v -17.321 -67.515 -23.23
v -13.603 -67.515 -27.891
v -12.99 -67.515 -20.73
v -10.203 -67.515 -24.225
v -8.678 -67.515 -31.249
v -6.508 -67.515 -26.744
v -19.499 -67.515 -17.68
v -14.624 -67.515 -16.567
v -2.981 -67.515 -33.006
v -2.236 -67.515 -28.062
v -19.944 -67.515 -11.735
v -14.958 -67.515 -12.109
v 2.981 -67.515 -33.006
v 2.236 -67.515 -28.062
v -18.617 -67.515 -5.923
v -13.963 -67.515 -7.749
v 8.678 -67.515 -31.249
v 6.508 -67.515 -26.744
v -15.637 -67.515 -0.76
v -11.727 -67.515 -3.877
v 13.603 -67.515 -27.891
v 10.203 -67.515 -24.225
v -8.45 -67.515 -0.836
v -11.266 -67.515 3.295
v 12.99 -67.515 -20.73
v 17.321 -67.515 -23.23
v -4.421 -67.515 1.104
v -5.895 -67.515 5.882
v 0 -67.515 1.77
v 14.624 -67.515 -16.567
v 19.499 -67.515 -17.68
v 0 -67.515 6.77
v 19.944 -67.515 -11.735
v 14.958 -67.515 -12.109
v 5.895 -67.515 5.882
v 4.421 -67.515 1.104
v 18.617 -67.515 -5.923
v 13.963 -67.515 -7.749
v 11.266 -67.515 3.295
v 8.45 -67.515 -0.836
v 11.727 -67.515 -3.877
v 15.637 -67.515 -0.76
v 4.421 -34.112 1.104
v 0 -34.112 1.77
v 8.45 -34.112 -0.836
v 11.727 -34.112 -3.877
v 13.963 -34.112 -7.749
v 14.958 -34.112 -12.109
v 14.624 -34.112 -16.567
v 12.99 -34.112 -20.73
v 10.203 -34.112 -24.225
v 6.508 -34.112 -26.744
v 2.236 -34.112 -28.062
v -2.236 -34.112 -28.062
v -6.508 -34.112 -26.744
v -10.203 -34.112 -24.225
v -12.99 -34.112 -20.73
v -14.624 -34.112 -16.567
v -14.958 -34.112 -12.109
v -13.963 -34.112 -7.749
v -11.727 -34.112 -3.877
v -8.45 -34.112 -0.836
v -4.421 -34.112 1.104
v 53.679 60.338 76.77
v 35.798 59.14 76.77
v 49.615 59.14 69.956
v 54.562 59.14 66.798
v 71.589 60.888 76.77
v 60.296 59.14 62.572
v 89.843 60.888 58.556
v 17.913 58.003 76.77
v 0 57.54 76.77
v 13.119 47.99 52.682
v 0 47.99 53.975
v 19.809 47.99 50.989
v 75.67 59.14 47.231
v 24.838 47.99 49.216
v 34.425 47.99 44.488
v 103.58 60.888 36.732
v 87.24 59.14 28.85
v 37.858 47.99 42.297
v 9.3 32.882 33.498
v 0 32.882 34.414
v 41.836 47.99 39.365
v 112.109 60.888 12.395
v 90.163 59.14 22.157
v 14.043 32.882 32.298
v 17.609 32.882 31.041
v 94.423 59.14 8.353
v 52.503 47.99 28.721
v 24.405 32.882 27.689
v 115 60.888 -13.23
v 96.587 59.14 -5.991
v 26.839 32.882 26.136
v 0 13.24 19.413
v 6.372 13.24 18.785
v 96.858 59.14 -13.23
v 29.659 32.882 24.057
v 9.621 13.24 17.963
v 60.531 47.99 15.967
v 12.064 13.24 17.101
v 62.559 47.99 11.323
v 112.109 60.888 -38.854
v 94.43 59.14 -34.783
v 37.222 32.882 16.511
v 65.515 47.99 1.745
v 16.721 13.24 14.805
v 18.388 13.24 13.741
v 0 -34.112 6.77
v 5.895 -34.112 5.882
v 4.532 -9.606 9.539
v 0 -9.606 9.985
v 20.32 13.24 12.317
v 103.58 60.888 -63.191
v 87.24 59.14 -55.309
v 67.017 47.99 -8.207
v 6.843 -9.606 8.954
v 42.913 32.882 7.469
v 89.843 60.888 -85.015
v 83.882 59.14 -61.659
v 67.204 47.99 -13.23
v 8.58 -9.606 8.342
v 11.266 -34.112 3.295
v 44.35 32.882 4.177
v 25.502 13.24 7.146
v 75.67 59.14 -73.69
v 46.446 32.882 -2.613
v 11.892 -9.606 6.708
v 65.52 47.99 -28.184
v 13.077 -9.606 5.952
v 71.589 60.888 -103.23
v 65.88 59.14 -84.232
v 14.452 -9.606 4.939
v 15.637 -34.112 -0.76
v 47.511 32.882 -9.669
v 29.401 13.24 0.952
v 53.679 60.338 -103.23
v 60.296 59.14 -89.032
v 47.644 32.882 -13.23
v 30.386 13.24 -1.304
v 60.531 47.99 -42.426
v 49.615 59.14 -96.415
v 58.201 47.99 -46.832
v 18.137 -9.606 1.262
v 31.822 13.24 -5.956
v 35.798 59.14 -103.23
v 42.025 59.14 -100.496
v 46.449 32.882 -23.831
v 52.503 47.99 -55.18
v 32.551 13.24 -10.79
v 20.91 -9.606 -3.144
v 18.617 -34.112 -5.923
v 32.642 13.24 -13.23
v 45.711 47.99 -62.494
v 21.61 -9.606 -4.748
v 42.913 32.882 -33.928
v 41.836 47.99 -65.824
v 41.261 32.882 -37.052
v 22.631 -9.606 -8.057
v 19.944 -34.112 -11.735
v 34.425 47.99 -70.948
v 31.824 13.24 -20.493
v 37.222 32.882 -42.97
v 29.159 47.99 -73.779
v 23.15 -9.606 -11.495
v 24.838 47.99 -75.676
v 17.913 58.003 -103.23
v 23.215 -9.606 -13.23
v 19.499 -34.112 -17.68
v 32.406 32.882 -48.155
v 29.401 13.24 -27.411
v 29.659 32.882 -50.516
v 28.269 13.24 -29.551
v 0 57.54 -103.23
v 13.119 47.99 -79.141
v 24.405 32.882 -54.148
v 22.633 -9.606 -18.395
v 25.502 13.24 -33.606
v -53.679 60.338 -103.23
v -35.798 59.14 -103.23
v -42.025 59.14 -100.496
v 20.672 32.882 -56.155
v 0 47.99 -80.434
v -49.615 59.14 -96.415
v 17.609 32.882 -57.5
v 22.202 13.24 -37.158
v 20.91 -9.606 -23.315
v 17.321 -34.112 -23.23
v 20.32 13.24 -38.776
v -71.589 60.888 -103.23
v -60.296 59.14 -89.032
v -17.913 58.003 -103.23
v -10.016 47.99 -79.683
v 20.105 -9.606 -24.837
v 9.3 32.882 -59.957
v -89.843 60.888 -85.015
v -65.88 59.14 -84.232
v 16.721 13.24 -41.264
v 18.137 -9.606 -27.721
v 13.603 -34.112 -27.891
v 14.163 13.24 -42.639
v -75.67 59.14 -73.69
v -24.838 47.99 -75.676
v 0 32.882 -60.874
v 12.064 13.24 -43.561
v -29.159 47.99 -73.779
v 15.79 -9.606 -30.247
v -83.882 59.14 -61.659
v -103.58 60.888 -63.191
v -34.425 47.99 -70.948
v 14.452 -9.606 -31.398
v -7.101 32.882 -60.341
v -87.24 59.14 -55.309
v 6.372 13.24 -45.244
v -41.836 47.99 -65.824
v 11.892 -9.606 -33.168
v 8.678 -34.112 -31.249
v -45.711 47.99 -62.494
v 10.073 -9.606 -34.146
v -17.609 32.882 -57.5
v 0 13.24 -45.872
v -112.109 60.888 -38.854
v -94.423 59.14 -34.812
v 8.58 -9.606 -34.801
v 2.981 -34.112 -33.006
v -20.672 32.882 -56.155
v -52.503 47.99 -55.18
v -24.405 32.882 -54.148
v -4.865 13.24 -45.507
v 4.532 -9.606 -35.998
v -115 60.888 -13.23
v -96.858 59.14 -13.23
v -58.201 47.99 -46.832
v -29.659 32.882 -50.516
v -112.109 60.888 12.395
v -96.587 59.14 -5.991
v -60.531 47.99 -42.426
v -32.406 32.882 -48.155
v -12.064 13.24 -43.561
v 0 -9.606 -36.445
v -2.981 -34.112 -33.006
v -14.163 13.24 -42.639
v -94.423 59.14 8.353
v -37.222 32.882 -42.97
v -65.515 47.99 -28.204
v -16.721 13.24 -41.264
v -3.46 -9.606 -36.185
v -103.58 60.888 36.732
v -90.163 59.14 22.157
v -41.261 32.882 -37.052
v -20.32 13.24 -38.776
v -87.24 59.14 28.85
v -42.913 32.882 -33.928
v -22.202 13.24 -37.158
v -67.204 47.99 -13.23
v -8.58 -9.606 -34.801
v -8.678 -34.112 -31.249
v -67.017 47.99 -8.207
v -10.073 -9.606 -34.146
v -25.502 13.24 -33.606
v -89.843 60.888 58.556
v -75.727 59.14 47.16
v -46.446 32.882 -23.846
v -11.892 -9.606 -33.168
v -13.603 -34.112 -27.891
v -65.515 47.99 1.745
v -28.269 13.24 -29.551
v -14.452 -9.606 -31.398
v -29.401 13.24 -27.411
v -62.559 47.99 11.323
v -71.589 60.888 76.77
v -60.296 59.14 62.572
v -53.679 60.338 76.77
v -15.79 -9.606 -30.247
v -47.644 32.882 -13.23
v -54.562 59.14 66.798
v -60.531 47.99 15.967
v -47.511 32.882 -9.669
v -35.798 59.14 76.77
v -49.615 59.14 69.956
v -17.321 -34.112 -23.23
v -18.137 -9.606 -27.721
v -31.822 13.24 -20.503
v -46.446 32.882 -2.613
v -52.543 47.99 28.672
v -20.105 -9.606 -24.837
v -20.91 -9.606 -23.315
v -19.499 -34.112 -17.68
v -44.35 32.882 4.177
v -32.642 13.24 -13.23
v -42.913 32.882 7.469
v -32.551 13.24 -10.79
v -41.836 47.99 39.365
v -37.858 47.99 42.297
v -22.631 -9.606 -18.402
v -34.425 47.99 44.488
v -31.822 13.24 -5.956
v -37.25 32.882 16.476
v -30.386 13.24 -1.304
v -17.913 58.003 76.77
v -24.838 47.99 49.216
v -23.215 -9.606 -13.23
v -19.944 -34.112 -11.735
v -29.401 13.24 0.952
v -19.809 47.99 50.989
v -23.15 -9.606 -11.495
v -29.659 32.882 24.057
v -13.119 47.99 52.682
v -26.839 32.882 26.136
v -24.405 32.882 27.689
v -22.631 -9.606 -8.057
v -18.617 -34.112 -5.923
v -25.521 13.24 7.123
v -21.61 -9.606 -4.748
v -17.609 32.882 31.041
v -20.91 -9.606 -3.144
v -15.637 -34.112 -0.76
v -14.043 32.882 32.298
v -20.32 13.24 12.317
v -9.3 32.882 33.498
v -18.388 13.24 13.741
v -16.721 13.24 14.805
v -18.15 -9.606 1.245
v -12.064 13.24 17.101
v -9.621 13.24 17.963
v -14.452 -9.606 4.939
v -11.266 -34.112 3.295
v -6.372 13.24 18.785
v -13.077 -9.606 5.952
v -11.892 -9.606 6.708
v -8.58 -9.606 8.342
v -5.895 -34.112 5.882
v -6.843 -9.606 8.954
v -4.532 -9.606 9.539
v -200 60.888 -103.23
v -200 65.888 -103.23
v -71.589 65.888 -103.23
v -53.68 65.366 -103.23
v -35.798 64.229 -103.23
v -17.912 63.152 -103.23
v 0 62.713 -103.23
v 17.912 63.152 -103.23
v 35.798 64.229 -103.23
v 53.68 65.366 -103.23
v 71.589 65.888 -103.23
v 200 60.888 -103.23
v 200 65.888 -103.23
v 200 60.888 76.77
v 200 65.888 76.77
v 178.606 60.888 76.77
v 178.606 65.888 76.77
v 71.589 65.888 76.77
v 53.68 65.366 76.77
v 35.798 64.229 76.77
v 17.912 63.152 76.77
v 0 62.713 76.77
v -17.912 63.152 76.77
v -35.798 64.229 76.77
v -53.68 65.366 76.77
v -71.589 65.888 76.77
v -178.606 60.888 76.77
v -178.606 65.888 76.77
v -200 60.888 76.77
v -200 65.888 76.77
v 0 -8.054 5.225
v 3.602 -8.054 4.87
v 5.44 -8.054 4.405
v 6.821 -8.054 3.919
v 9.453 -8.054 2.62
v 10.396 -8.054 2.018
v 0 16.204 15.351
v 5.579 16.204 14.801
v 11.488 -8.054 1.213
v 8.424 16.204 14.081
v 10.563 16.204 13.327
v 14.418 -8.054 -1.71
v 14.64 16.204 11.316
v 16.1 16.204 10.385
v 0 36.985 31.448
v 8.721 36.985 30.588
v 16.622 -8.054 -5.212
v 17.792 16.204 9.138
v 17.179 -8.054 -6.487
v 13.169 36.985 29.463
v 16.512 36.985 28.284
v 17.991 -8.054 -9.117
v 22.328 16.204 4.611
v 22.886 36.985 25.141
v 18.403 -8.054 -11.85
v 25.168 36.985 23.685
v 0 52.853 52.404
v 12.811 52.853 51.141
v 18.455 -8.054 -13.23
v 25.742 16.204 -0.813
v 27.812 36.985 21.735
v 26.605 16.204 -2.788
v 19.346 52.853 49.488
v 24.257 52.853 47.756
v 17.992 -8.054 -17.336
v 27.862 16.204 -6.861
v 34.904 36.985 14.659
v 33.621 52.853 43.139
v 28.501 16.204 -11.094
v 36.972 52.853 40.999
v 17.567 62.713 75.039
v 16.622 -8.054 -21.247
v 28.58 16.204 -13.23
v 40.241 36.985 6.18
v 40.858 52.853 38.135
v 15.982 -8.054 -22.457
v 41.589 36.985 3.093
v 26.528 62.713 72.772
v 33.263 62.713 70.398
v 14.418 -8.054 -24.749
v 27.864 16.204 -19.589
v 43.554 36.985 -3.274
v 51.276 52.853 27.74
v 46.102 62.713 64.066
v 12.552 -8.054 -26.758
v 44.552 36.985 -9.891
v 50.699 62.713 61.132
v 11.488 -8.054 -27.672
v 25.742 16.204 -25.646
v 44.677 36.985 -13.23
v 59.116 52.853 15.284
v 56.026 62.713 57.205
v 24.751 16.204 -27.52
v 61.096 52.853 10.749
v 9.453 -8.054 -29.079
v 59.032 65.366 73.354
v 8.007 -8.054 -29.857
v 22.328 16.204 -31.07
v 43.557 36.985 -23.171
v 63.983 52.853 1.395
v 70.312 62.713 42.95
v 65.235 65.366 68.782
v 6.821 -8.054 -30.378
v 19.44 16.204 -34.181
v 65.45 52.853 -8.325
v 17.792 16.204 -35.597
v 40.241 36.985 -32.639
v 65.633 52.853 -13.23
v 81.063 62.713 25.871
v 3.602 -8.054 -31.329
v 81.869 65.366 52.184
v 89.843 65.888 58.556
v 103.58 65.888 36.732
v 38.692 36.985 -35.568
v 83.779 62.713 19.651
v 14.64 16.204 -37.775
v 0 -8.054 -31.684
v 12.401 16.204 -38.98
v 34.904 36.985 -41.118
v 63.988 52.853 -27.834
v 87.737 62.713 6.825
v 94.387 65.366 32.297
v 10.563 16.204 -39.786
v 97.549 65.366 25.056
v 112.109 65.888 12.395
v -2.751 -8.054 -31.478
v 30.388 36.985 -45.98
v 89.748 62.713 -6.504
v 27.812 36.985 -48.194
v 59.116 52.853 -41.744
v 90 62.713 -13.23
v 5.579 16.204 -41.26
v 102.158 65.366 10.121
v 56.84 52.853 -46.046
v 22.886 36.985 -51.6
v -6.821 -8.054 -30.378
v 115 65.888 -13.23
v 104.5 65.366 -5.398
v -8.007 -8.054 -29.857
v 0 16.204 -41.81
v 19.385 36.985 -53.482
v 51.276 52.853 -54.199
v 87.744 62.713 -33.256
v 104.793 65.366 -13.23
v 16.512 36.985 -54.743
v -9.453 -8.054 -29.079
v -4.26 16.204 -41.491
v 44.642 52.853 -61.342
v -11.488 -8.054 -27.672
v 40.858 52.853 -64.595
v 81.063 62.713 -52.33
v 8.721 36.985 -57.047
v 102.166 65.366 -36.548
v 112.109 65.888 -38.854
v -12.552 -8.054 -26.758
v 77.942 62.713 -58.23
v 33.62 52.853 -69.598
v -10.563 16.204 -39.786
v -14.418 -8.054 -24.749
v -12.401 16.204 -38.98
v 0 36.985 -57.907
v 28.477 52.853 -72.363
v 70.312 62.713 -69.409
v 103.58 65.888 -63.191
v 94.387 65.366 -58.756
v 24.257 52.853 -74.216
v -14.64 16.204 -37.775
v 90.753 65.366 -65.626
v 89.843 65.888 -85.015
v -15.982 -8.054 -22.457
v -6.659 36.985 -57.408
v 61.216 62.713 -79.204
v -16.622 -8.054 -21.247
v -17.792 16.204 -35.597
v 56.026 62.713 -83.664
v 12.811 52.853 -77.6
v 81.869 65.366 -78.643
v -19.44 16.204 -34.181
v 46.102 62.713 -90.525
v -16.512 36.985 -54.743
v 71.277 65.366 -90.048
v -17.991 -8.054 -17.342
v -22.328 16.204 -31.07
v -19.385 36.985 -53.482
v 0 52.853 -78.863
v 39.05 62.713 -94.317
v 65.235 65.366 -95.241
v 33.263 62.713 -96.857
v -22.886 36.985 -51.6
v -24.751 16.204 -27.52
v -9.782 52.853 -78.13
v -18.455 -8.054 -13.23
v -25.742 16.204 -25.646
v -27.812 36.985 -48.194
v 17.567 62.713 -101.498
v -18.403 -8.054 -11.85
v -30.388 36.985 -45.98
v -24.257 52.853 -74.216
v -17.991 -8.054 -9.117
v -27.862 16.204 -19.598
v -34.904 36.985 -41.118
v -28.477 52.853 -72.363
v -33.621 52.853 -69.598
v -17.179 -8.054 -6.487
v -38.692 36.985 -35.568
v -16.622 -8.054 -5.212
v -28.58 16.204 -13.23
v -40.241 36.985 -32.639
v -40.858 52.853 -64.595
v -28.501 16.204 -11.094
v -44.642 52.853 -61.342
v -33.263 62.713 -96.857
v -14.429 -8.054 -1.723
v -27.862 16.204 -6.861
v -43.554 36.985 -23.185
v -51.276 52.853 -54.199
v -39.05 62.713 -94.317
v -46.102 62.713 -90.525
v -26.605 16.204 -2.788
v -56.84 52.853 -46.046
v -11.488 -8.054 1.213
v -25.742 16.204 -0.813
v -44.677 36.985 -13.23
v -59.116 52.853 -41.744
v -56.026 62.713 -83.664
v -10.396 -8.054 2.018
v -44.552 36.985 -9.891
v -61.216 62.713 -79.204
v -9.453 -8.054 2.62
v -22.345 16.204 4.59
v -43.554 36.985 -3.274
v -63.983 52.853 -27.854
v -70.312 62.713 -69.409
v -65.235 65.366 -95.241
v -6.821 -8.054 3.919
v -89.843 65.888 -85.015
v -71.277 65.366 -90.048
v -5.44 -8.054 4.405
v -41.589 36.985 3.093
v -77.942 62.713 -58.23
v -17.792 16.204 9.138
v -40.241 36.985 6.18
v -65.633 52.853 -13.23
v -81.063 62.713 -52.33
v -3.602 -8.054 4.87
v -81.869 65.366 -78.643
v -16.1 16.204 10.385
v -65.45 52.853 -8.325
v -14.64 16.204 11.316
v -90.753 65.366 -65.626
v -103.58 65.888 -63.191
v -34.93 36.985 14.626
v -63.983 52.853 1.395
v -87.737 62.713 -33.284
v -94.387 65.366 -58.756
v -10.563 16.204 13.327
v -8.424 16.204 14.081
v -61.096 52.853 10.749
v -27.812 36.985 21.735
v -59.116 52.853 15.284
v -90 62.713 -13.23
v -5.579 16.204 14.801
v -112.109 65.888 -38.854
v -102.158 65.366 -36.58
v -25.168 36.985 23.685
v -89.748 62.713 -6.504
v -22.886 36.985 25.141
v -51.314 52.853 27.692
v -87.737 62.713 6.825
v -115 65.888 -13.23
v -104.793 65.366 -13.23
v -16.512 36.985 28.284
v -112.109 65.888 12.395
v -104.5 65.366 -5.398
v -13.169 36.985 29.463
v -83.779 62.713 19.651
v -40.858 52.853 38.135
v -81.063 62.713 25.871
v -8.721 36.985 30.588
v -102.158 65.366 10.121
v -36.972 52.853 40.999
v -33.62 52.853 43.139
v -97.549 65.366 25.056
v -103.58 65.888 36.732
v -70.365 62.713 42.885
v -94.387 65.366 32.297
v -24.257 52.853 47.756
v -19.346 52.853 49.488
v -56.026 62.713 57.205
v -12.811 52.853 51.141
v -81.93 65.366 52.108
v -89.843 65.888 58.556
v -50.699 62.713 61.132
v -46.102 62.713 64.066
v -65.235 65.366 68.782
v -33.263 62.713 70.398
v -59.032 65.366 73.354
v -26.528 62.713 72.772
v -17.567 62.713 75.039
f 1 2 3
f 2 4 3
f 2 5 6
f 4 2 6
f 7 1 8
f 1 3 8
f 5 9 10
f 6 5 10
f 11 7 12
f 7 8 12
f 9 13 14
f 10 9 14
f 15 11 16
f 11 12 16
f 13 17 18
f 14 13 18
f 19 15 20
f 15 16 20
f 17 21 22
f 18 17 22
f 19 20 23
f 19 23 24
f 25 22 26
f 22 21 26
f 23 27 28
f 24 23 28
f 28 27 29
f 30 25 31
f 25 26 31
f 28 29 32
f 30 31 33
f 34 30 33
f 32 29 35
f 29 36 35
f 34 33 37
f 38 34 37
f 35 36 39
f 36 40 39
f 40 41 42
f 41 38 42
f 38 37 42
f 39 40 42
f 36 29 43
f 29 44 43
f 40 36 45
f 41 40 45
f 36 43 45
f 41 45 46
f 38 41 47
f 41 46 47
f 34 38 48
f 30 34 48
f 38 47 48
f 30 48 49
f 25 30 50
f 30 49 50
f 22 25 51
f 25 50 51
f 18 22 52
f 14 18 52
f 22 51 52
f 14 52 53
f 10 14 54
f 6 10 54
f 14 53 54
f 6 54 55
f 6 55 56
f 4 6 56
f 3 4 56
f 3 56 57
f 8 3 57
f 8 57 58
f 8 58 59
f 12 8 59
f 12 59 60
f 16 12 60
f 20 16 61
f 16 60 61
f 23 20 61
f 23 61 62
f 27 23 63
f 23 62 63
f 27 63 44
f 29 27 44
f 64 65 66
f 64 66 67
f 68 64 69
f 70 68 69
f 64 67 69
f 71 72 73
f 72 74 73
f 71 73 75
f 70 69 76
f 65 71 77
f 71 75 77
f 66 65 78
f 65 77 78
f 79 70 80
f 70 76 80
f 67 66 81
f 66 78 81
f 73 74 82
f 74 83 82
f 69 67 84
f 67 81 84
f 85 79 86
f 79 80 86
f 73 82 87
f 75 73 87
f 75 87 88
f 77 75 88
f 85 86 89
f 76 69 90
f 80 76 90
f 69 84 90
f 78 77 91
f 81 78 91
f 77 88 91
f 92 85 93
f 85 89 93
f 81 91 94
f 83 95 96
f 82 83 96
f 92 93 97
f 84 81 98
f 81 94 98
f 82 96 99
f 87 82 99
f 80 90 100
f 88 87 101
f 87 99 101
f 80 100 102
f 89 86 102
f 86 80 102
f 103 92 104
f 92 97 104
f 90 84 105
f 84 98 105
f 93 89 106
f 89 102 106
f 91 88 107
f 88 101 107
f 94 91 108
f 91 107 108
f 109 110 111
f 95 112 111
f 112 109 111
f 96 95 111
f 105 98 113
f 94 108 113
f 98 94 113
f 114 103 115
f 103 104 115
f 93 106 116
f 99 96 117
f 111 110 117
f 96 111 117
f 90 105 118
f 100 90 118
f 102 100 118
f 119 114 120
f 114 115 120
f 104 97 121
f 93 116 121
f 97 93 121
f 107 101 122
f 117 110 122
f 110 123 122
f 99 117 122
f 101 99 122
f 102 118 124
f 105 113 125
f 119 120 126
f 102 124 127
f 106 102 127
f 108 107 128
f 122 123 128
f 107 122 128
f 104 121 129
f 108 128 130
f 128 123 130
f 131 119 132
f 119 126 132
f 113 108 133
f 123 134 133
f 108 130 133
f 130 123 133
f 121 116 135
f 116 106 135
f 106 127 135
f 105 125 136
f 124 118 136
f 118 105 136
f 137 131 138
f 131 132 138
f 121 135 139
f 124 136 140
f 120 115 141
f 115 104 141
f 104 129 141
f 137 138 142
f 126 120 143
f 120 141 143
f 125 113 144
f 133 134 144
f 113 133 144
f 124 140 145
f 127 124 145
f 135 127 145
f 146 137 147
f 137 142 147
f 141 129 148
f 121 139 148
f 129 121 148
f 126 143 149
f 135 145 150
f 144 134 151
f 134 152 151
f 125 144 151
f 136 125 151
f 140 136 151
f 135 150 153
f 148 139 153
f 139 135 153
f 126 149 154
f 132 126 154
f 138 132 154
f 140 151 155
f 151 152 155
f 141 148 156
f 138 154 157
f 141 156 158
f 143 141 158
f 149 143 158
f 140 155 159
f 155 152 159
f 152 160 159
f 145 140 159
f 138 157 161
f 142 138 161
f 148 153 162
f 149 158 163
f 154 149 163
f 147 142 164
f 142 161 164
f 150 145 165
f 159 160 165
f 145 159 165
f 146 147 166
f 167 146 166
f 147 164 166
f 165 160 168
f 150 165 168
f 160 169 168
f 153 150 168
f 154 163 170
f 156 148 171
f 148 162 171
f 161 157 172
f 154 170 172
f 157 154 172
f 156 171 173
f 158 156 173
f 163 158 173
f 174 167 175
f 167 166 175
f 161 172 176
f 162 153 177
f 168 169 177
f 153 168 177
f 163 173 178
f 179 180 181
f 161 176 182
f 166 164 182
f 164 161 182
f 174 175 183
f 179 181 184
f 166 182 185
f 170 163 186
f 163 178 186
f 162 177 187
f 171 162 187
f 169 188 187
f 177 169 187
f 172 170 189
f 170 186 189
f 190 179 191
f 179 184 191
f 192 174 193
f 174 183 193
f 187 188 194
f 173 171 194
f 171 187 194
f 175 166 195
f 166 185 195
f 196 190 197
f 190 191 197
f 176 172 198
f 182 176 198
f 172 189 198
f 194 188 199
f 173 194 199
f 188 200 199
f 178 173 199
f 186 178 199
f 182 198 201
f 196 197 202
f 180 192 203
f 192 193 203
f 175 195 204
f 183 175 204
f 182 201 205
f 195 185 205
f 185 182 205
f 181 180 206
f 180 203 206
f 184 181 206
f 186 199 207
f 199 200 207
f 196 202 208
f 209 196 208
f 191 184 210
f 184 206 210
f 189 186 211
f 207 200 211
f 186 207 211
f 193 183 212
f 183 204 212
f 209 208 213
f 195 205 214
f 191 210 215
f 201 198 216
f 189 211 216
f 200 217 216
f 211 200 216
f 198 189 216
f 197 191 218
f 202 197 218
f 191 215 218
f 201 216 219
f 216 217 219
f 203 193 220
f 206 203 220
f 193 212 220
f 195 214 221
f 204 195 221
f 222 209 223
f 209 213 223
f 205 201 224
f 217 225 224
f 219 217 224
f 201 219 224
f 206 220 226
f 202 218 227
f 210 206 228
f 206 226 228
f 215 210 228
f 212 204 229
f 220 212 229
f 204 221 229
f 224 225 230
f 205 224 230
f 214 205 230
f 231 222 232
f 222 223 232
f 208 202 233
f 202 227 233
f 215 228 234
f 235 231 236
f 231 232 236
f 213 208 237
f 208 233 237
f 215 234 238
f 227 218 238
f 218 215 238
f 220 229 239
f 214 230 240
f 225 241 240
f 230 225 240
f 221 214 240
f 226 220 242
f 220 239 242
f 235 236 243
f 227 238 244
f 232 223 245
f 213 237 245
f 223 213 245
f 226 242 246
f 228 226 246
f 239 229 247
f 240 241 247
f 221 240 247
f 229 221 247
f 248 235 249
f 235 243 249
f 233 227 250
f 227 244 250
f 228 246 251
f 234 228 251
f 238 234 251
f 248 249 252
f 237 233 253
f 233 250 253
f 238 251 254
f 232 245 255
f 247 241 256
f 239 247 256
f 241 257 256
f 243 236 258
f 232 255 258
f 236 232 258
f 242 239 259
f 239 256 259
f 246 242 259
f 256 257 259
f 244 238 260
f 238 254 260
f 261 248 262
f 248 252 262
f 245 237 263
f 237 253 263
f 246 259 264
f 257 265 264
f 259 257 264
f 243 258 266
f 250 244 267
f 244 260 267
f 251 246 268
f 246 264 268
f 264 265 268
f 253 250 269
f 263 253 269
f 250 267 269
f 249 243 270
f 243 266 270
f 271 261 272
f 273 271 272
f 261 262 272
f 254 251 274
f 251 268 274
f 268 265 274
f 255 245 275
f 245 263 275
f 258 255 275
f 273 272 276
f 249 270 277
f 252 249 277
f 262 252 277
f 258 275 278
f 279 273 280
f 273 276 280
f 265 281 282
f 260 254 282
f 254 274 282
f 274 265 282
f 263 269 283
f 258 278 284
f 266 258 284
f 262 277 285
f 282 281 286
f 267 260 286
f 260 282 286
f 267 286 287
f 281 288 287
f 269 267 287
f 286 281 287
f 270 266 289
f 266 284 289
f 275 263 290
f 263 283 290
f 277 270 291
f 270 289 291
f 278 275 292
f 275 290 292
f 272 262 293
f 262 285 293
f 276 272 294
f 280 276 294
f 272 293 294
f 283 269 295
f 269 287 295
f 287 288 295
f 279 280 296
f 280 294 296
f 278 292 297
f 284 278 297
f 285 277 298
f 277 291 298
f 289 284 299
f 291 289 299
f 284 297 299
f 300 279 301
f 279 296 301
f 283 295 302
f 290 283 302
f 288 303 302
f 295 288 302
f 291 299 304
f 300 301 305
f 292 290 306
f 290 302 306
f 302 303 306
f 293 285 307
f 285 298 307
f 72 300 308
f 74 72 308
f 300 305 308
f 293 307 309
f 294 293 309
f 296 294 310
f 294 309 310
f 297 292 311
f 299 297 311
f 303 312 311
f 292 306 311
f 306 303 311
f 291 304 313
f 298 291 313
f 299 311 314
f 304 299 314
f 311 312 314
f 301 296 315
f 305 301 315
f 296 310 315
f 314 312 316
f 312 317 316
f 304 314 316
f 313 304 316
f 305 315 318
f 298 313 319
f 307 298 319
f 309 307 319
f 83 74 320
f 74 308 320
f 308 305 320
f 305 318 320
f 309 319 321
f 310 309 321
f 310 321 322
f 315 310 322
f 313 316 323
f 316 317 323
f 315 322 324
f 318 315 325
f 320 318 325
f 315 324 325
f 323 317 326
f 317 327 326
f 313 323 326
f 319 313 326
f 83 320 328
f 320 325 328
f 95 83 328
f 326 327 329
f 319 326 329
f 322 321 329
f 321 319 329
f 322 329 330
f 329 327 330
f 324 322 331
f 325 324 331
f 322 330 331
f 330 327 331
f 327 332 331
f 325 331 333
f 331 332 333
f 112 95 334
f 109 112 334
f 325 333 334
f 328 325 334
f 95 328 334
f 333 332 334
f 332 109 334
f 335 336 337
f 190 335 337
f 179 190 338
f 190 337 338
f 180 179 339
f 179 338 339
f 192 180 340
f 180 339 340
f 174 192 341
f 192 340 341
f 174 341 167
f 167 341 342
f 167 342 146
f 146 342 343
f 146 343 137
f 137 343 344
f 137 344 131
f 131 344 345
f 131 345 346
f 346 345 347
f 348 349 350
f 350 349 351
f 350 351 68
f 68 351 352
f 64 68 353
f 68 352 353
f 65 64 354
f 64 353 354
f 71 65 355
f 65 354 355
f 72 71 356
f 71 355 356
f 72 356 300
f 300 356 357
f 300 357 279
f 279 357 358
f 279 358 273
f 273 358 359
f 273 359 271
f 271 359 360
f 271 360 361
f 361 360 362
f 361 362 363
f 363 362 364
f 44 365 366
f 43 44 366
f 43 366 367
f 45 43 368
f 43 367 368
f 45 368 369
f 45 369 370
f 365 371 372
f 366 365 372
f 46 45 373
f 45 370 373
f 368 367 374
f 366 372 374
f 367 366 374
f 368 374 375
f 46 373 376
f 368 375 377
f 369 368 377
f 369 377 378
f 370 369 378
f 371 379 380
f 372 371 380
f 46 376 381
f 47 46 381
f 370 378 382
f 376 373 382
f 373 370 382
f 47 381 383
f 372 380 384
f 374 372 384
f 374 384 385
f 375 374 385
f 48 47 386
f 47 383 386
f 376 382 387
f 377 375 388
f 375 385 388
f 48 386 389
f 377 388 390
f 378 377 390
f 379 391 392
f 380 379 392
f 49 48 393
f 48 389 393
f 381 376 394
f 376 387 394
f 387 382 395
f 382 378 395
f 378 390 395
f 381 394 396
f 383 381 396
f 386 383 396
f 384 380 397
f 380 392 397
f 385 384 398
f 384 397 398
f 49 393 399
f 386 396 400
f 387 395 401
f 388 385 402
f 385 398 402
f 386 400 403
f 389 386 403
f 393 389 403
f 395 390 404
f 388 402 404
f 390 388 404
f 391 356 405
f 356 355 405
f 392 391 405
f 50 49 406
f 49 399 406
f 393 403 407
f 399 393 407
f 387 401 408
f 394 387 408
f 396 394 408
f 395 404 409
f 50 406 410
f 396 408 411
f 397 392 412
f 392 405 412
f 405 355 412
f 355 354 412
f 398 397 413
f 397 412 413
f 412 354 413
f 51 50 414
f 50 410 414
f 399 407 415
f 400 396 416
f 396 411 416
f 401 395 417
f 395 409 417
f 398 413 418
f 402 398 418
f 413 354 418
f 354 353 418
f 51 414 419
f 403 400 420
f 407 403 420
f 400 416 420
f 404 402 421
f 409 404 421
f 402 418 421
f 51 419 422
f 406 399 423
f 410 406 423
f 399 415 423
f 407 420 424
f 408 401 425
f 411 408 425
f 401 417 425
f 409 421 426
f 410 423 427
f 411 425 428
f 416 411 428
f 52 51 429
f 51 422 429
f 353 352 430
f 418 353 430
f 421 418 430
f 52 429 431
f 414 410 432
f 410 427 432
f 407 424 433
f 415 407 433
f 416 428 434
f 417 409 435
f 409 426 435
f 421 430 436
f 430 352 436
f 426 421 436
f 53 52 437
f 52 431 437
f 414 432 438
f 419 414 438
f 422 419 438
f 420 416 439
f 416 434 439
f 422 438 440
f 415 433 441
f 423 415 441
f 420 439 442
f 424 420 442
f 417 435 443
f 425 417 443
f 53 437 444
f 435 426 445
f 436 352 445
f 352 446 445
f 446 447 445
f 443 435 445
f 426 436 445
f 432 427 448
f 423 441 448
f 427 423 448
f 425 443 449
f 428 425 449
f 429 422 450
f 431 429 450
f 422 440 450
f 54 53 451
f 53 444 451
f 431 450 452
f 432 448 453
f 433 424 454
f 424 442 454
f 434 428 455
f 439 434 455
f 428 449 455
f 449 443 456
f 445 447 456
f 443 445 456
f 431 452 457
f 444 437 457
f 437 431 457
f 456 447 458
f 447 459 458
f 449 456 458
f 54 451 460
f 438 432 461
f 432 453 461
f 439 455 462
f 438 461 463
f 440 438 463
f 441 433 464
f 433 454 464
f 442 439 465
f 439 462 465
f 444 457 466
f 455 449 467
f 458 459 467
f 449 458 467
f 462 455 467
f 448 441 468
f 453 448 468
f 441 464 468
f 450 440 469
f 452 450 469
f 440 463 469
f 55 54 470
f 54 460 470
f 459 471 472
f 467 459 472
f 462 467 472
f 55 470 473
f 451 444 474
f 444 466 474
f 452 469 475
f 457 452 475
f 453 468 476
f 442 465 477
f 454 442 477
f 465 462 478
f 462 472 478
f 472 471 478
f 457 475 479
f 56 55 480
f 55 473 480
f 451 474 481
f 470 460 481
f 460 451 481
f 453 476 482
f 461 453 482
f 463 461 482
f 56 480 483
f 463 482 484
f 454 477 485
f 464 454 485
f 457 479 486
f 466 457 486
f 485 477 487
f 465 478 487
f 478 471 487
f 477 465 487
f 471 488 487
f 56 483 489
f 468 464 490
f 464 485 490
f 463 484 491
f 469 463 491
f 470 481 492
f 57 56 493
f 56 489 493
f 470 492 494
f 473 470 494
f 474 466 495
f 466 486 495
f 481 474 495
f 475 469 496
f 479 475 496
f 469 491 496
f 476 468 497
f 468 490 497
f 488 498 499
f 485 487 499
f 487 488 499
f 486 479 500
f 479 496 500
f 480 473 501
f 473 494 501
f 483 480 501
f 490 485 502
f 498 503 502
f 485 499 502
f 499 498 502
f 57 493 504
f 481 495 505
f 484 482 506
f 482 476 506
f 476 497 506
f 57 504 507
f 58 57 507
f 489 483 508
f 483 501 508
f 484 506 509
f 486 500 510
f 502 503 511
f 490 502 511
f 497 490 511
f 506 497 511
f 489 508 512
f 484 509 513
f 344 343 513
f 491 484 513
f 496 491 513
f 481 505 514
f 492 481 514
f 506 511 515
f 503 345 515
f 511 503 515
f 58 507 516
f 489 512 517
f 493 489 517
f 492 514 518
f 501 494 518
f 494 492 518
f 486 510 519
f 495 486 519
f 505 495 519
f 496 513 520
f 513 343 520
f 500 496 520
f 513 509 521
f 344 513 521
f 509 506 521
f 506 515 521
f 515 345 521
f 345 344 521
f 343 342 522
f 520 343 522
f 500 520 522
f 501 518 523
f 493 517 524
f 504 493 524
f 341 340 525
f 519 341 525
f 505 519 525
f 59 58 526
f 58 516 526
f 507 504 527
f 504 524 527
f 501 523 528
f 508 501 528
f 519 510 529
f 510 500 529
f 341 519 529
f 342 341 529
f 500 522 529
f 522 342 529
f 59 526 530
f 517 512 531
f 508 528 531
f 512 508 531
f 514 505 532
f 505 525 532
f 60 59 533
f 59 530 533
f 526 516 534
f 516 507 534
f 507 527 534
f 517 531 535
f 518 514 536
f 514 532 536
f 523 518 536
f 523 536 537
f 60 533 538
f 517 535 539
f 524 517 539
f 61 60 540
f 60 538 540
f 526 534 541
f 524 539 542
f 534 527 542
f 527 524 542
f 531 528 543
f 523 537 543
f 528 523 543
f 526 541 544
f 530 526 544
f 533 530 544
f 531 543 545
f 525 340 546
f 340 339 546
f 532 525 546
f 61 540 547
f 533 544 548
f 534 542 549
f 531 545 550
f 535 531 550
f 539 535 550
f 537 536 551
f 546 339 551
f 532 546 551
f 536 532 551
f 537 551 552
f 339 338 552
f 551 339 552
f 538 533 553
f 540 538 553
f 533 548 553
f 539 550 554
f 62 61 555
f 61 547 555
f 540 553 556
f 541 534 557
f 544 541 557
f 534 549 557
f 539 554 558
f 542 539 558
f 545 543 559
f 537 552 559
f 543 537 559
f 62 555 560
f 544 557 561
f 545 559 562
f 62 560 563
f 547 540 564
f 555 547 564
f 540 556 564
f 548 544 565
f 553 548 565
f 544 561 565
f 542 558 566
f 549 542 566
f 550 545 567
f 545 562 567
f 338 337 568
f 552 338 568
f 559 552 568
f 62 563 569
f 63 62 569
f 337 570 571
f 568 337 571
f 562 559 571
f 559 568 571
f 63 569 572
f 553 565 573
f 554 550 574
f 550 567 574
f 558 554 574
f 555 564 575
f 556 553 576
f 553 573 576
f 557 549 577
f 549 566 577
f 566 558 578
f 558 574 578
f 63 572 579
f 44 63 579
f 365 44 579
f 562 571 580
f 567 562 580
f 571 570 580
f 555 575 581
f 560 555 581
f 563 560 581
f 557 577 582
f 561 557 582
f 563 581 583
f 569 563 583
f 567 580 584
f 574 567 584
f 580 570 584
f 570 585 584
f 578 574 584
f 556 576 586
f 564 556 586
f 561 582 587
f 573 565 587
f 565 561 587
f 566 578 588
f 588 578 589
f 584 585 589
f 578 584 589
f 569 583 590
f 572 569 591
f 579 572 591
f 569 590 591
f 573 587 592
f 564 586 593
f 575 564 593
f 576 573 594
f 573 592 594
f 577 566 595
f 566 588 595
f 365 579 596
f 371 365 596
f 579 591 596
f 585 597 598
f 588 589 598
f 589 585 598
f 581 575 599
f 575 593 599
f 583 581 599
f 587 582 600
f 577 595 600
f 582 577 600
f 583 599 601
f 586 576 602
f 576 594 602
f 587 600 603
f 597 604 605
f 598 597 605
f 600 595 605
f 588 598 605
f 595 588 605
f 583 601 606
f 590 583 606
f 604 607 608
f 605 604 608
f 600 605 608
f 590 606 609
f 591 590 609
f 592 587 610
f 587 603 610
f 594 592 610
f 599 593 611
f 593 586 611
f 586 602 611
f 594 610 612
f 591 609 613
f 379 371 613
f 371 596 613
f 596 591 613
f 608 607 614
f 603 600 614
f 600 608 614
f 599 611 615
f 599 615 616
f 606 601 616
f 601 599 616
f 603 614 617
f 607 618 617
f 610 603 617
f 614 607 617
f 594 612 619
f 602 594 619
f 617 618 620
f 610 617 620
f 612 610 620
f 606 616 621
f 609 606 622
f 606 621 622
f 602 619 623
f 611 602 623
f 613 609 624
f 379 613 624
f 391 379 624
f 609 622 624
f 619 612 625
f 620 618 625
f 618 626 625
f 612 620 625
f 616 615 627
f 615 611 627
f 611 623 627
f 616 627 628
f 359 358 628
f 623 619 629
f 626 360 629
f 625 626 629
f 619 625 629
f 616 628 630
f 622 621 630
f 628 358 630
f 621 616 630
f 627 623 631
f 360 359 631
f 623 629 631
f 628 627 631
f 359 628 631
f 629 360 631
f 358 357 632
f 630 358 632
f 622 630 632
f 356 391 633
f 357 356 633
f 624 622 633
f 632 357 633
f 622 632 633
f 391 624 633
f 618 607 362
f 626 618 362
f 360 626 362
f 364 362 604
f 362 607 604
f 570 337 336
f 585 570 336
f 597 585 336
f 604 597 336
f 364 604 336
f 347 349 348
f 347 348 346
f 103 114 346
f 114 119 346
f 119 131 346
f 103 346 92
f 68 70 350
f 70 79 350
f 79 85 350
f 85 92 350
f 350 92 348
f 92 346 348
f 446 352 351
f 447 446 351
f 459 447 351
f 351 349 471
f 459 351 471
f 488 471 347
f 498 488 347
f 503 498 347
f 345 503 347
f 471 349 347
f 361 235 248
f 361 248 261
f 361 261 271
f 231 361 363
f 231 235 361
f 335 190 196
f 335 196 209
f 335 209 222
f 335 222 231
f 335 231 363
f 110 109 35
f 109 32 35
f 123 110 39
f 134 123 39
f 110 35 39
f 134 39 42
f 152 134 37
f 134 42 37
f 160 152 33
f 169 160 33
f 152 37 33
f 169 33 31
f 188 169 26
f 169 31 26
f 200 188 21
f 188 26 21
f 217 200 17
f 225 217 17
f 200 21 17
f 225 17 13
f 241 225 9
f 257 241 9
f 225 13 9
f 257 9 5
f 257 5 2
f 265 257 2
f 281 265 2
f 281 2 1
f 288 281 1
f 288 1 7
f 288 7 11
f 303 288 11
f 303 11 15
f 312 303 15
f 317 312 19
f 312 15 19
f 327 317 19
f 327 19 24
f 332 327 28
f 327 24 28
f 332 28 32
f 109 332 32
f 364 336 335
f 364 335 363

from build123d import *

# Parameters (mm, degrees)
ESQUISSE4_W             = 400
ESQUISSE4_H             = 131.578163935
ESQUISSE4_H_2           = 129.819251152
ENL_V_MAT_EXTRU_1_DEPTH = 10
BOSS_EXTRU_2_DEPTH      = 5


with BuildPart() as part:
    # Esquisse1 → Révolution3 (revolve)
    with BuildSketch(Plane(origin=(0, 0, 0), x_dir=(0, 0, -1), z_dir=(1, 0, 0))):
        with BuildLine():
            Line((-1.770428016, -67.515182568), (-1.770428016, -34.11154345))
            ThreePointArc((-1.770428016, -34.11154345), (-31.059749897, 36.599134669), (-101.770428016, 65.88845655))
            Line((-101.770428016, 65.88845655), (-186.770428016, 65.88845655))
            Line((-186.770428016, 65.88845655), (-186.770428016, 60.88845655))
            Line((-186.770428016, 60.88845655), (-101.770428016, 60.88845655))
            ThreePointArc((-101.770428016, 60.88845655), (-34.595283803, 33.063600763), (-6.770428016, -34.11154345))
            Line((-6.770428016, -34.11154345), (-6.770428016, -67.515182568))
            Line((-6.770428016, -67.515182568), (-1.770428016, -67.515182568))
        make_face()
    revolve(axis=Axis((0, -67.515182568, -13.229571984), (0, 1, 0)))

    # Esquisse4 → Enlèv. mat.-Extru.1 (cut)
    with BuildSketch(Plane(origin=(0, 65.88845655, 0), x_dir=(1, 0, 0), z_dir=(0, 1, 0))):
        with Locations((0, -142.559509983)):
            Rectangle(ESQUISSE4_W, ESQUISSE4_H)
        with Locations((0, 168.13919756)):
            Rectangle(ESQUISSE4_W, ESQUISSE4_H_2)
    extrude(amount=-ENL_V_MAT_EXTRU_1_DEPTH, mode=Mode.SUBTRACT)

    # Esquisse5 → Boss.-Extru.2 (add)
    with BuildSketch(Plane(origin=(0, 65.88845655, 0), x_dir=(1, 0, 0), z_dir=(0, 1, 0))):
        Polygon((-200, 13.229571984), (-200, 103.229571984), (-178.605710995, 103.229571984), (-178.605710995, -76.770428016), (-200, -76.770428016), align=None)
        Polygon((200, 13.229571984), (200, 103.229571984), (178.605710995, 103.229571984), (178.605710995, -76.770428016), (200, -76.770428016), align=None)
    extrude(amount=-BOSS_EXTRU_2_DEPTH)


solid = part.part
